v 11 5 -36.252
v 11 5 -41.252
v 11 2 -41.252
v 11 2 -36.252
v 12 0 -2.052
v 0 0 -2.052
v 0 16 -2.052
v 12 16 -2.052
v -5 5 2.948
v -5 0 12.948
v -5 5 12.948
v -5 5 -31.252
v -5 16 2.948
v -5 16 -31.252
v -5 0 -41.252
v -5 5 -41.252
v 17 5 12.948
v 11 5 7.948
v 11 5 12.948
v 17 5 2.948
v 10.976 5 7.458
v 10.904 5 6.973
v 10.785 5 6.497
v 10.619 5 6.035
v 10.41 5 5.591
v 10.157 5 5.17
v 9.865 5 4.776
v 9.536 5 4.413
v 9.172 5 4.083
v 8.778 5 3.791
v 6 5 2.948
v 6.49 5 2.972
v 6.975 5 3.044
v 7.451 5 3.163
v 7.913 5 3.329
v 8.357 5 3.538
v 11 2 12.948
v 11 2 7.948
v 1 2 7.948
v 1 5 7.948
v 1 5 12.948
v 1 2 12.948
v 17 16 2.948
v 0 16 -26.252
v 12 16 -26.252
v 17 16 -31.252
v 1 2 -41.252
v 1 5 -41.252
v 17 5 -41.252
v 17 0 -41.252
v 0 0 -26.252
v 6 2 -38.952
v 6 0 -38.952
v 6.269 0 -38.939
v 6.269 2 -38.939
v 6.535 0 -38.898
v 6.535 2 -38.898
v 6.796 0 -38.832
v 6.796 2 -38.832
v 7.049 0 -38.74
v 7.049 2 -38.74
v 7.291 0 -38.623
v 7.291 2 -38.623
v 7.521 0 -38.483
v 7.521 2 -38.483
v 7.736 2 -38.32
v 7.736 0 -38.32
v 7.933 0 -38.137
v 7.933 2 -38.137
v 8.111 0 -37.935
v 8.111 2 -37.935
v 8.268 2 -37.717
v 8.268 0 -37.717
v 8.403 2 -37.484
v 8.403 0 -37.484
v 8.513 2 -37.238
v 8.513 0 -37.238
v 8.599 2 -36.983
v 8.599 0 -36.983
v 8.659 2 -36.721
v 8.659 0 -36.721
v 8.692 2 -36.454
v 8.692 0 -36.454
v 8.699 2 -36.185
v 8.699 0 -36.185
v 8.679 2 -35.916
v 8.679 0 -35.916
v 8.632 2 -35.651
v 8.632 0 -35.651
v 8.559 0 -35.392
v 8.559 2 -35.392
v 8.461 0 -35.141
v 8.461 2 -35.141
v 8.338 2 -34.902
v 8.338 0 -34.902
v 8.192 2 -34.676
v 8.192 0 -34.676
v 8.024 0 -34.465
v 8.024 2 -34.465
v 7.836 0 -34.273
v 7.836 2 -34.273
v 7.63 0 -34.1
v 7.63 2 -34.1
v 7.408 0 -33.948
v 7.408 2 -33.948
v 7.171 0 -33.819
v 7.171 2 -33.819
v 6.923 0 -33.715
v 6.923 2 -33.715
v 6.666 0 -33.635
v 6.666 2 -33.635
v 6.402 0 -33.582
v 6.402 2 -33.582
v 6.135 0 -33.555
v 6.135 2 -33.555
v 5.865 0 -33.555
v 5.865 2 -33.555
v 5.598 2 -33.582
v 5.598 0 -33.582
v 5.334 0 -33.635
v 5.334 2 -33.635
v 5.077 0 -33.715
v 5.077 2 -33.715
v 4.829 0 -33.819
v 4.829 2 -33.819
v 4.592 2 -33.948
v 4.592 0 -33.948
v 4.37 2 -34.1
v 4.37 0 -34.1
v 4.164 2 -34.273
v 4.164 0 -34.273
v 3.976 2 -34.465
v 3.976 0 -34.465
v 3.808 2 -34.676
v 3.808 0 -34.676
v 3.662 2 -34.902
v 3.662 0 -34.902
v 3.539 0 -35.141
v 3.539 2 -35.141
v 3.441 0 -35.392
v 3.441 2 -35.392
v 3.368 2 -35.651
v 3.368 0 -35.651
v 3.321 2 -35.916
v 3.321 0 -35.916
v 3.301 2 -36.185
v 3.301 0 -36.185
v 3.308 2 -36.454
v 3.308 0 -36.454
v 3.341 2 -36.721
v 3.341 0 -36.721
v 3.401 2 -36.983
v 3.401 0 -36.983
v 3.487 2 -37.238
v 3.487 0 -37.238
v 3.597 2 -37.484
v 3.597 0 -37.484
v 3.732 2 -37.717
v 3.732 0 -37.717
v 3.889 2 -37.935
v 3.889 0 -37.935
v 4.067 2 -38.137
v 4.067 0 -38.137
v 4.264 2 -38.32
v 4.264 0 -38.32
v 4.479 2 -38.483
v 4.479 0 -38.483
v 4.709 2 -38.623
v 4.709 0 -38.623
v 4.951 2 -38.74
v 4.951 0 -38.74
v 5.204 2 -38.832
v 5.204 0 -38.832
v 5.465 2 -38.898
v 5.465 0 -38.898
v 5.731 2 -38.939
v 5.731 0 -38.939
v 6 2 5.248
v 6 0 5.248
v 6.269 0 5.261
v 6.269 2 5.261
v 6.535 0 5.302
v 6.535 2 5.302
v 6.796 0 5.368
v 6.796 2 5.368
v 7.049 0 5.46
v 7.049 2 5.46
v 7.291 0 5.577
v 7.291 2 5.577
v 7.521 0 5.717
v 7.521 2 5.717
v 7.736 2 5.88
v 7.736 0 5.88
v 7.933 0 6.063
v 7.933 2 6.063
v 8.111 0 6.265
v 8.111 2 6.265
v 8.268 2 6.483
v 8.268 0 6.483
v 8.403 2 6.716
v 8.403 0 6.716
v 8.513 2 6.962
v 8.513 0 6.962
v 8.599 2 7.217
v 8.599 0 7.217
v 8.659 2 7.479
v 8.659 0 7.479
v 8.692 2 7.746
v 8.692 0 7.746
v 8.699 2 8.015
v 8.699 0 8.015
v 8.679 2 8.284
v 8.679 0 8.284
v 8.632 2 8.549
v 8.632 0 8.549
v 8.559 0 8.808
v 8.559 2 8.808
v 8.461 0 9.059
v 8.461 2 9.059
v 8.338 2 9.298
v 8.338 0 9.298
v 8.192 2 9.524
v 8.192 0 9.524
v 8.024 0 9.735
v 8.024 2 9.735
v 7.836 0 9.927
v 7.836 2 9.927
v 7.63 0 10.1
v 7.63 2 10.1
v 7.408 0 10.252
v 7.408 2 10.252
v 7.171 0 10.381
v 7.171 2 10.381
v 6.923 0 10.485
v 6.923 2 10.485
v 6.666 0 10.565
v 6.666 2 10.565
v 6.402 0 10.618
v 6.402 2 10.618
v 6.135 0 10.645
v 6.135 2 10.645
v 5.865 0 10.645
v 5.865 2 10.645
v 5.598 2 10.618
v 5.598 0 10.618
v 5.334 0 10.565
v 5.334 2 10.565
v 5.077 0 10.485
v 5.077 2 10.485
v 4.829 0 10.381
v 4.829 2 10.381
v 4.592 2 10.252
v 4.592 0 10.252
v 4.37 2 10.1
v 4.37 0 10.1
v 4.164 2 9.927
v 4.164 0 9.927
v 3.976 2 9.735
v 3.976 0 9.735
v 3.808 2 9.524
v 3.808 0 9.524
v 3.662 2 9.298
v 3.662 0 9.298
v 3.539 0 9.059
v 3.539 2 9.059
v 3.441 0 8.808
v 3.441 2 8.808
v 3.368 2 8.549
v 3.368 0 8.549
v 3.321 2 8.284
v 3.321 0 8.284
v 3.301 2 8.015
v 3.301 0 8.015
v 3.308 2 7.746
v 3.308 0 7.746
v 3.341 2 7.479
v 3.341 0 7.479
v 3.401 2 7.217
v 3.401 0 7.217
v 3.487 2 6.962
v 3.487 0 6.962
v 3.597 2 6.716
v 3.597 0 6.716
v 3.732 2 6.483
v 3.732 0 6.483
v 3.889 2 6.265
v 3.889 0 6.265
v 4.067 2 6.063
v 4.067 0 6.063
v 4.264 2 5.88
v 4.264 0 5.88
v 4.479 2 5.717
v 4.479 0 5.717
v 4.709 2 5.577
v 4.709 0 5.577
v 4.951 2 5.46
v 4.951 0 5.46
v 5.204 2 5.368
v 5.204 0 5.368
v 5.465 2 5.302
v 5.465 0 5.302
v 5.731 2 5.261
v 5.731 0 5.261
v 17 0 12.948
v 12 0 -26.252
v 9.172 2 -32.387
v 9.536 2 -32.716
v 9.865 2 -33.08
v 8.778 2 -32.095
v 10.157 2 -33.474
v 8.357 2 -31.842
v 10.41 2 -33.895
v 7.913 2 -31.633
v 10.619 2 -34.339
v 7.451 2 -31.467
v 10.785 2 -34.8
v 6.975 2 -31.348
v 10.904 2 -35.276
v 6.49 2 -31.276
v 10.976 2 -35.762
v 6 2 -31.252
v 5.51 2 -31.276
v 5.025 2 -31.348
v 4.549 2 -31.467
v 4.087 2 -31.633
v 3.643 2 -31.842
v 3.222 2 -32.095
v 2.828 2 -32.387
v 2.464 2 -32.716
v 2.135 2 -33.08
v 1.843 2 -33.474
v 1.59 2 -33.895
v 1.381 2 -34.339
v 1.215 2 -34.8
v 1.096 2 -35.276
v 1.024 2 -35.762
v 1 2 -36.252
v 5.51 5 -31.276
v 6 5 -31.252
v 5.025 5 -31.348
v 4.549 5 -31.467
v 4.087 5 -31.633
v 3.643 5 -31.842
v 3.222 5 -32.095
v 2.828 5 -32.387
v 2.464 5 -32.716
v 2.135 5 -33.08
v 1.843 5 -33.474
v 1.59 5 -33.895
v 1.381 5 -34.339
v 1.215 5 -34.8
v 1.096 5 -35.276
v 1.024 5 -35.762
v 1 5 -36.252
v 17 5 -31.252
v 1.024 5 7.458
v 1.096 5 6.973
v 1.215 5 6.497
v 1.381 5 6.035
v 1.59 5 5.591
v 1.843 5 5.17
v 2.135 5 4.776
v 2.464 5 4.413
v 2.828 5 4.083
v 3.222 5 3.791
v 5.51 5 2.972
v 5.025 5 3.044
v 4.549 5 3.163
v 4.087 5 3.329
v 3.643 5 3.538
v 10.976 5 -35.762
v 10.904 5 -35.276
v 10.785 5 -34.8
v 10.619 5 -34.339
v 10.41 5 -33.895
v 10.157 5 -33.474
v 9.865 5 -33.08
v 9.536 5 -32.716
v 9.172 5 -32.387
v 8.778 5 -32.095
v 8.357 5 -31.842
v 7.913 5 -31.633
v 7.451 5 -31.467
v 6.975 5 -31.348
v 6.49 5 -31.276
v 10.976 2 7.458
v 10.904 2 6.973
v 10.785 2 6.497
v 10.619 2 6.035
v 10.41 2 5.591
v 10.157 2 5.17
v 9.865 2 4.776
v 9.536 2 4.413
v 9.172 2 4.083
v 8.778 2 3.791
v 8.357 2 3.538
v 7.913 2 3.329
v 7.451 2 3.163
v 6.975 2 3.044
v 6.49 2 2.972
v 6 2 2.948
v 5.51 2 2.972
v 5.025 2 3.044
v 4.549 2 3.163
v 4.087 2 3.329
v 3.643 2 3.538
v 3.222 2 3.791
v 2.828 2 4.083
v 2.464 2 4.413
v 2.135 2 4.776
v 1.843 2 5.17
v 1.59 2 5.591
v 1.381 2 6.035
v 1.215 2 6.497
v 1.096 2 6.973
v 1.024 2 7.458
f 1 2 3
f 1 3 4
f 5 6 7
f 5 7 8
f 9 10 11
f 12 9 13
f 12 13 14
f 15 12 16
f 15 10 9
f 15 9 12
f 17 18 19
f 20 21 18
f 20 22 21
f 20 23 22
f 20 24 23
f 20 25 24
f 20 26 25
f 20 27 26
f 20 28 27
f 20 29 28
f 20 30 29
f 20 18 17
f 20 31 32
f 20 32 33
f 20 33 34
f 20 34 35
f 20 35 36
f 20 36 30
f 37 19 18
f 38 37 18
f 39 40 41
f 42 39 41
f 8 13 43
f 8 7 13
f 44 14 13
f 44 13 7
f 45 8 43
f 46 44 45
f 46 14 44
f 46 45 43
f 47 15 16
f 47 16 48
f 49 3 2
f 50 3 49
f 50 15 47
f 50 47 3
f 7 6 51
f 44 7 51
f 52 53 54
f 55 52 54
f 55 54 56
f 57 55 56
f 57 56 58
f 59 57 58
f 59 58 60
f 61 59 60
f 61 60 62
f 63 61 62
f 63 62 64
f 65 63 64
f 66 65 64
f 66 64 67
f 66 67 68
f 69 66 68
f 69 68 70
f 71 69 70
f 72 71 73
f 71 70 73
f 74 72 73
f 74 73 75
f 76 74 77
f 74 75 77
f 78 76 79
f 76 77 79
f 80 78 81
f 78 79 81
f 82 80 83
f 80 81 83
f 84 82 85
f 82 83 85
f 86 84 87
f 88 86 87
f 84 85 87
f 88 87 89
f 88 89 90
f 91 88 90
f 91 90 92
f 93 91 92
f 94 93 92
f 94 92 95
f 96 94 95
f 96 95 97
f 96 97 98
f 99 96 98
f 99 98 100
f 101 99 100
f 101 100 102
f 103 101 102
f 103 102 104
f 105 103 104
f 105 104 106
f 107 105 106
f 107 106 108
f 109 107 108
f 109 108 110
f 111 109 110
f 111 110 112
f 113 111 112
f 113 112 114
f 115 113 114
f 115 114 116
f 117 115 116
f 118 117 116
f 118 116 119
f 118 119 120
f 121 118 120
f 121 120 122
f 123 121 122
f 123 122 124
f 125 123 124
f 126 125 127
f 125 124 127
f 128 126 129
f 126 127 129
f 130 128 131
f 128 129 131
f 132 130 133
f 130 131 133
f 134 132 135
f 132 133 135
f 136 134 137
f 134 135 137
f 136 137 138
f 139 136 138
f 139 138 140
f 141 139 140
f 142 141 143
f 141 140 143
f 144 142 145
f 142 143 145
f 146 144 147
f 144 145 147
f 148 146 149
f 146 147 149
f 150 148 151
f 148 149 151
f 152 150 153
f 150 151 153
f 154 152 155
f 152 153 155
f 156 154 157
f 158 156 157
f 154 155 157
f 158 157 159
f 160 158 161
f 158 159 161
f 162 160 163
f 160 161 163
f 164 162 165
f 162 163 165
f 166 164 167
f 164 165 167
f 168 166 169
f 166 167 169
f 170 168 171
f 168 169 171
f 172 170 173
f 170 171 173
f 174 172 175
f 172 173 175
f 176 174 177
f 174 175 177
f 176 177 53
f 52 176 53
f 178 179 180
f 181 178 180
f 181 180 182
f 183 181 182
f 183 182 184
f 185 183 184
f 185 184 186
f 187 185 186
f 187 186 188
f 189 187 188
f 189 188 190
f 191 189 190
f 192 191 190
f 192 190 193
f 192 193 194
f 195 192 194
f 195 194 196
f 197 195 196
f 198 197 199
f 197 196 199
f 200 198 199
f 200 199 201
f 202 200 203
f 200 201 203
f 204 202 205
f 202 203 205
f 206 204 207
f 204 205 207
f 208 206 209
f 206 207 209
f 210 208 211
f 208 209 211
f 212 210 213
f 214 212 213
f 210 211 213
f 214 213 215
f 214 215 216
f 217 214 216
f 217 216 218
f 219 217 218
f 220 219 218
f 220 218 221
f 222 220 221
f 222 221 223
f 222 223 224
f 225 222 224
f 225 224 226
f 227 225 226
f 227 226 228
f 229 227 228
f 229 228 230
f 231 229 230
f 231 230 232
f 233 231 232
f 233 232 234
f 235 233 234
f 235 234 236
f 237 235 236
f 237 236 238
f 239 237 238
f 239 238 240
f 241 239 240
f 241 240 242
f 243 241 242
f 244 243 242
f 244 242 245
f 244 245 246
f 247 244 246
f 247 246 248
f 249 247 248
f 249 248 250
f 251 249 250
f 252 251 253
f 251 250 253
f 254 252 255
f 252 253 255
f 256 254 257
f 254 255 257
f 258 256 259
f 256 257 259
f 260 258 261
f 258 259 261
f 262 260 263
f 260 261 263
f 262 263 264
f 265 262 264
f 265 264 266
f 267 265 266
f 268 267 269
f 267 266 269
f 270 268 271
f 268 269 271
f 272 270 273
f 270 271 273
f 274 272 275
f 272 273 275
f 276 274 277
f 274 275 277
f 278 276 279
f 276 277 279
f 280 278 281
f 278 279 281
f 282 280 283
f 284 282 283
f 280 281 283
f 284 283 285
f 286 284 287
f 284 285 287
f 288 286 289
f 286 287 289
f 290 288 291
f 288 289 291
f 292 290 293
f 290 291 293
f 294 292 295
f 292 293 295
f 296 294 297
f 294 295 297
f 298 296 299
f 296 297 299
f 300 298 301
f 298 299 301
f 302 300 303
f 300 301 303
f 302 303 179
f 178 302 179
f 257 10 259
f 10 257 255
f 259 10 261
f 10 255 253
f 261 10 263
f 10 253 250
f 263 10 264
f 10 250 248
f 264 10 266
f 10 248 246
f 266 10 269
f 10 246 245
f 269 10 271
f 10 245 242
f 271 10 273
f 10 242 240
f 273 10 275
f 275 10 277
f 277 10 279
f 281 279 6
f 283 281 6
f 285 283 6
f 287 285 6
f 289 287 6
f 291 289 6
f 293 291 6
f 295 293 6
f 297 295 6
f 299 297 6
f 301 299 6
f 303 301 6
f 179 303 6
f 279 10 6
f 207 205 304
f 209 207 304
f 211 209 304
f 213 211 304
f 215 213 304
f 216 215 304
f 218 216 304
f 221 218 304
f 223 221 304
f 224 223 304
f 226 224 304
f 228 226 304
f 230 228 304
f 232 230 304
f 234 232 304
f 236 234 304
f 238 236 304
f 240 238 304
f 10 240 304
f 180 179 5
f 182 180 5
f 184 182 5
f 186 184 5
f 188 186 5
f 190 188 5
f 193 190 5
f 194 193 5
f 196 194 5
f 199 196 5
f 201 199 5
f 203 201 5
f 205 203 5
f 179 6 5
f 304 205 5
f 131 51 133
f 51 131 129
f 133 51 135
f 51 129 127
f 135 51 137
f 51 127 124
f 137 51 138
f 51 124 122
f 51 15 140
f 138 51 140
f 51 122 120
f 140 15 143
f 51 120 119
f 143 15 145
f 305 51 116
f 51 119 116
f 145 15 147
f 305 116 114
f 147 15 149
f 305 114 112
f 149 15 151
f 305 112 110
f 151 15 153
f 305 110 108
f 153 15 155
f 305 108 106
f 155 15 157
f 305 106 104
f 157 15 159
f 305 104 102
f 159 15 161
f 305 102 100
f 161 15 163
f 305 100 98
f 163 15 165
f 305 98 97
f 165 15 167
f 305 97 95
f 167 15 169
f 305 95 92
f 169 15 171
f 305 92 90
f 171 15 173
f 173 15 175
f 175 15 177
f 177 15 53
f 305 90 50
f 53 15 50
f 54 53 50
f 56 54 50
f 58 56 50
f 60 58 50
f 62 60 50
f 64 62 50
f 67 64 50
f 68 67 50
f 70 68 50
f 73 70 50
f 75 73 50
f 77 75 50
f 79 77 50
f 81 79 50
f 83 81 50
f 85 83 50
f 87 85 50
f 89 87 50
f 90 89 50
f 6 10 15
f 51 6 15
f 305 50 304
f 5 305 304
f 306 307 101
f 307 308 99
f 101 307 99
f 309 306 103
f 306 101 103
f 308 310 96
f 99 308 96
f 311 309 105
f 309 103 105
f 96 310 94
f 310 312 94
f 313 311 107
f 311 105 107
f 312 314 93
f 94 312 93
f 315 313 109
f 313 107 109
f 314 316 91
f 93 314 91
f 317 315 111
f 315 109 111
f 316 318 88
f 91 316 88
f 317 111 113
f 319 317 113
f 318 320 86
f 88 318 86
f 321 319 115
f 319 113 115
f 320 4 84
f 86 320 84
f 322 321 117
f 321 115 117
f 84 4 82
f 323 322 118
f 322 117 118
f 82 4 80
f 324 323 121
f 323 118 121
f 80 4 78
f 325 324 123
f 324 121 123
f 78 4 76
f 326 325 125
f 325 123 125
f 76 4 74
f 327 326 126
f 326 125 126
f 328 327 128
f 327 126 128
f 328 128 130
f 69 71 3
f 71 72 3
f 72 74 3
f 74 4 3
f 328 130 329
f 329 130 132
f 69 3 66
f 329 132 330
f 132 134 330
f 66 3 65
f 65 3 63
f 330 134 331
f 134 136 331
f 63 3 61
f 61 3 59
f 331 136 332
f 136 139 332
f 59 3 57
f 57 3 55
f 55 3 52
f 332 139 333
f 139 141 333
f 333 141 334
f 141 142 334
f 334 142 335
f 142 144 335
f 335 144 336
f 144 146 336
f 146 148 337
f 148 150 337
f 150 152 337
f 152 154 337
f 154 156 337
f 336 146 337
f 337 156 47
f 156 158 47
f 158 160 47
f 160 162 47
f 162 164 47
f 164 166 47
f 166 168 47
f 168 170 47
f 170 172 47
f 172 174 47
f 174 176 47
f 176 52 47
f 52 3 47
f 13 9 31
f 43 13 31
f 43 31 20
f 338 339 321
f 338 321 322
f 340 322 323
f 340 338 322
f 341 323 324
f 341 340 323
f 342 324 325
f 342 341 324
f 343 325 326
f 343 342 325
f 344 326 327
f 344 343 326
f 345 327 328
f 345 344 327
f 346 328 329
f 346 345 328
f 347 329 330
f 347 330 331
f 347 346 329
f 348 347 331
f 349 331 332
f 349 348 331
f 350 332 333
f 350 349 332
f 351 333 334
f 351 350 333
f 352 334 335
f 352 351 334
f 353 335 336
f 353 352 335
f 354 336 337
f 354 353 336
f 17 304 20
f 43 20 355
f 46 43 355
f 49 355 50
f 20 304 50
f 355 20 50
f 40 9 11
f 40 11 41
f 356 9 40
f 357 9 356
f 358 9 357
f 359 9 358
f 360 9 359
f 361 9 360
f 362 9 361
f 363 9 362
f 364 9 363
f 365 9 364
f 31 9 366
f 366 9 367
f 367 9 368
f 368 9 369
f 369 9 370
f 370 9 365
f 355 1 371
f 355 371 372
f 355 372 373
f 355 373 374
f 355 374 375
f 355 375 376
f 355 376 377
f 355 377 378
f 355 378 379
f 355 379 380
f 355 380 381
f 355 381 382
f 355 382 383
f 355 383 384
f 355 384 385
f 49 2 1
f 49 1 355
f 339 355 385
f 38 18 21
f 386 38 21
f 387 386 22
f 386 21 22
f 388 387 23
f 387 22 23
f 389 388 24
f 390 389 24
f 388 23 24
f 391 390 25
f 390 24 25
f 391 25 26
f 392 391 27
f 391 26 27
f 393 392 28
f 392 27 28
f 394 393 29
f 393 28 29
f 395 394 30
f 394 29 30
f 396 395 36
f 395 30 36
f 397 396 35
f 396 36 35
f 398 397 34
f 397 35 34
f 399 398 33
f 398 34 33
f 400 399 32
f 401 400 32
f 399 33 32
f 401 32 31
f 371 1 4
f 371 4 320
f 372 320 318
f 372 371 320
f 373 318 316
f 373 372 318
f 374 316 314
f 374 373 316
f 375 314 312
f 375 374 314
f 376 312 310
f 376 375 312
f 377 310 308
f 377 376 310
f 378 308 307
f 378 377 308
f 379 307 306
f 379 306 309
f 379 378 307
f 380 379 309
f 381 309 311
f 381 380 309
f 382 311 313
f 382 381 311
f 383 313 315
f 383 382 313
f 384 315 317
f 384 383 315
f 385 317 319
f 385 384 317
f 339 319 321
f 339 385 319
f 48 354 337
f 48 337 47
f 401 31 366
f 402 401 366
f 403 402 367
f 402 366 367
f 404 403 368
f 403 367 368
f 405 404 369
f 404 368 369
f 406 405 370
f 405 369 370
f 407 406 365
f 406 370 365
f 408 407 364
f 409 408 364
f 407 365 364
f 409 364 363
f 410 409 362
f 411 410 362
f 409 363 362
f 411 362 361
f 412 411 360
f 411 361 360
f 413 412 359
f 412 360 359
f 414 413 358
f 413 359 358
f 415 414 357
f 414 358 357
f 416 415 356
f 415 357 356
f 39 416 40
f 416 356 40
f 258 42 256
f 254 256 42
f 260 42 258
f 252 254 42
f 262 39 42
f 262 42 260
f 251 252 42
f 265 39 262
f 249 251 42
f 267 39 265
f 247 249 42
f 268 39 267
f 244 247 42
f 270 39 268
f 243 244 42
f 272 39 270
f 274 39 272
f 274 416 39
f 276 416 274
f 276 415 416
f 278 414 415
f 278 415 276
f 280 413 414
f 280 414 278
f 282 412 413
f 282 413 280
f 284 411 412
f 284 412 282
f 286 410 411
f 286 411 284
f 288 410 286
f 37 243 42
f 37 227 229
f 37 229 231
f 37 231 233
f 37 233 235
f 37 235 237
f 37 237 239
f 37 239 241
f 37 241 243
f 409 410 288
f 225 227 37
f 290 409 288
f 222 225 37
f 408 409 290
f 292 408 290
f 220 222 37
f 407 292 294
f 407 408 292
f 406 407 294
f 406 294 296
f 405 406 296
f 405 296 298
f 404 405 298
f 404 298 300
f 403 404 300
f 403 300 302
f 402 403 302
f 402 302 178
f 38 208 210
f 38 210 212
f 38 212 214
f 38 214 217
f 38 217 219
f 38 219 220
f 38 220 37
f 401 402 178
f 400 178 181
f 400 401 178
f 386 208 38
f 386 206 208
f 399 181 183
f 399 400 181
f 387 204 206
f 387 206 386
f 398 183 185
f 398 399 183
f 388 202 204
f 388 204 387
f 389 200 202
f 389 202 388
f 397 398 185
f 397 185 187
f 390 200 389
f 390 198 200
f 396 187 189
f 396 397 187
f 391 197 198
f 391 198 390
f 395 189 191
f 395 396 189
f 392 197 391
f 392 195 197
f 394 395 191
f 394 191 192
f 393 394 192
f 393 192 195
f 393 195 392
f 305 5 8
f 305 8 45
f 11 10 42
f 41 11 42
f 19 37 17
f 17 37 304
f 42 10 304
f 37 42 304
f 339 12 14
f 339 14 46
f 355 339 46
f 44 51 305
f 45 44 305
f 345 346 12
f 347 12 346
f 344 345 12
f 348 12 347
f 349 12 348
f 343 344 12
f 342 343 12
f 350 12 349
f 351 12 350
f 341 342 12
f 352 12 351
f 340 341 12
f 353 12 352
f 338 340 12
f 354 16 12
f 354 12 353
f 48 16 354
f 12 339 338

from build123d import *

# Parameters (mm, degrees)
SKETCH3_W           = 22
SKETCH3_H           = 34.2
SKETCH3_W_2         = 12
SKETCH3_H_2         = 24.2
BOSS_EXTRUDE1_DEPTH = 16
SKETCH4_W           = 22
SKETCH4_H           = 10
BOSS_EXTRUDE2_DEPTH = 5
CUT_EXTRUDE6_DEPTH  = 3
SKETCH12_R          = 2.7
CUT_EXTRUDE7_DEPTH  = 3


with BuildPart() as part:
    # Sketch3 → Boss-Extrude1 (new body)
    with BuildSketch(Plane(origin=(0, 0, 0), x_dir=(1, 0, 0), z_dir=(0, 1, 0))):
        with Locations((6, 14.151918963)):
            Rectangle(SKETCH3_W, SKETCH3_H)
        with Locations((6, 14.151918963)):
            Rectangle(SKETCH3_W_2, SKETCH3_H_2, mode=Mode.SUBTRACT)
    extrude(amount=BOSS_EXTRUDE1_DEPTH)

    # Sketch4 → Boss-Extrude2 (add)
    with BuildSketch(Plane(origin=(0, 0, 0), x_dir=(1, 0, 0), z_dir=(0, 1, 0))):
        with Locations((6, 36.251918963)):
            Rectangle(SKETCH4_W, SKETCH4_H)
        with Locations((6, -7.948081037)):
            Rectangle(SKETCH4_W, SKETCH4_H)
    extrude(amount=BOSS_EXTRUDE2_DEPTH)

    # Sketch8 → Cut-Extrude6 (cut)
    with BuildSketch(Plane(origin=(0, 5, 0), x_dir=(1, 0, 0), z_dir=(0, 1, 0))):
        with BuildLine():
            Line((1, 36.251918963), (1, 41.251918963))
            Line((1, 41.251918963), (11, 41.251918963))
            Line((11, 41.251918963), (11, 36.251918963))
            ThreePointArc((11, 36.251918963), (9.535533906, 32.716385057), (6, 31.251918963))
            ThreePointArc((6, 31.251918963), (2.464466094, 32.716385057), (1, 36.251918963))
        make_face()
        with BuildLine():
            Line((1, -7.948081037), (1, -12.948081037))
            Line((1, -12.948081037), (11, -12.948081037))
            Line((11, -12.948081037), (11, -7.948081037))
            ThreePointArc((11, -7.948081037), (9.535533906, -4.412547131), (6, -2.948081037))
            ThreePointArc((6, -2.948081037), (2.464466094, -4.412547131), (1, -7.948081037))
        make_face()
    extrude(amount=-CUT_EXTRUDE6_DEPTH, mode=Mode.SUBTRACT)

    # Sketch12 → Cut-Extrude7 (cut)
    with BuildSketch(Plane.XZ):
        with Locations(Location((6, 7.948081037, 0), (0, 0, 270))):
            Circle(SKETCH12_R)
        with Locations(Location((6, -36.251918963, 0), (0, 0, 270))):
            Circle(SKETCH12_R)
    extrude(amount=-CUT_EXTRUDE7_DEPTH, mode=Mode.SUBTRACT)


solid = part.part
